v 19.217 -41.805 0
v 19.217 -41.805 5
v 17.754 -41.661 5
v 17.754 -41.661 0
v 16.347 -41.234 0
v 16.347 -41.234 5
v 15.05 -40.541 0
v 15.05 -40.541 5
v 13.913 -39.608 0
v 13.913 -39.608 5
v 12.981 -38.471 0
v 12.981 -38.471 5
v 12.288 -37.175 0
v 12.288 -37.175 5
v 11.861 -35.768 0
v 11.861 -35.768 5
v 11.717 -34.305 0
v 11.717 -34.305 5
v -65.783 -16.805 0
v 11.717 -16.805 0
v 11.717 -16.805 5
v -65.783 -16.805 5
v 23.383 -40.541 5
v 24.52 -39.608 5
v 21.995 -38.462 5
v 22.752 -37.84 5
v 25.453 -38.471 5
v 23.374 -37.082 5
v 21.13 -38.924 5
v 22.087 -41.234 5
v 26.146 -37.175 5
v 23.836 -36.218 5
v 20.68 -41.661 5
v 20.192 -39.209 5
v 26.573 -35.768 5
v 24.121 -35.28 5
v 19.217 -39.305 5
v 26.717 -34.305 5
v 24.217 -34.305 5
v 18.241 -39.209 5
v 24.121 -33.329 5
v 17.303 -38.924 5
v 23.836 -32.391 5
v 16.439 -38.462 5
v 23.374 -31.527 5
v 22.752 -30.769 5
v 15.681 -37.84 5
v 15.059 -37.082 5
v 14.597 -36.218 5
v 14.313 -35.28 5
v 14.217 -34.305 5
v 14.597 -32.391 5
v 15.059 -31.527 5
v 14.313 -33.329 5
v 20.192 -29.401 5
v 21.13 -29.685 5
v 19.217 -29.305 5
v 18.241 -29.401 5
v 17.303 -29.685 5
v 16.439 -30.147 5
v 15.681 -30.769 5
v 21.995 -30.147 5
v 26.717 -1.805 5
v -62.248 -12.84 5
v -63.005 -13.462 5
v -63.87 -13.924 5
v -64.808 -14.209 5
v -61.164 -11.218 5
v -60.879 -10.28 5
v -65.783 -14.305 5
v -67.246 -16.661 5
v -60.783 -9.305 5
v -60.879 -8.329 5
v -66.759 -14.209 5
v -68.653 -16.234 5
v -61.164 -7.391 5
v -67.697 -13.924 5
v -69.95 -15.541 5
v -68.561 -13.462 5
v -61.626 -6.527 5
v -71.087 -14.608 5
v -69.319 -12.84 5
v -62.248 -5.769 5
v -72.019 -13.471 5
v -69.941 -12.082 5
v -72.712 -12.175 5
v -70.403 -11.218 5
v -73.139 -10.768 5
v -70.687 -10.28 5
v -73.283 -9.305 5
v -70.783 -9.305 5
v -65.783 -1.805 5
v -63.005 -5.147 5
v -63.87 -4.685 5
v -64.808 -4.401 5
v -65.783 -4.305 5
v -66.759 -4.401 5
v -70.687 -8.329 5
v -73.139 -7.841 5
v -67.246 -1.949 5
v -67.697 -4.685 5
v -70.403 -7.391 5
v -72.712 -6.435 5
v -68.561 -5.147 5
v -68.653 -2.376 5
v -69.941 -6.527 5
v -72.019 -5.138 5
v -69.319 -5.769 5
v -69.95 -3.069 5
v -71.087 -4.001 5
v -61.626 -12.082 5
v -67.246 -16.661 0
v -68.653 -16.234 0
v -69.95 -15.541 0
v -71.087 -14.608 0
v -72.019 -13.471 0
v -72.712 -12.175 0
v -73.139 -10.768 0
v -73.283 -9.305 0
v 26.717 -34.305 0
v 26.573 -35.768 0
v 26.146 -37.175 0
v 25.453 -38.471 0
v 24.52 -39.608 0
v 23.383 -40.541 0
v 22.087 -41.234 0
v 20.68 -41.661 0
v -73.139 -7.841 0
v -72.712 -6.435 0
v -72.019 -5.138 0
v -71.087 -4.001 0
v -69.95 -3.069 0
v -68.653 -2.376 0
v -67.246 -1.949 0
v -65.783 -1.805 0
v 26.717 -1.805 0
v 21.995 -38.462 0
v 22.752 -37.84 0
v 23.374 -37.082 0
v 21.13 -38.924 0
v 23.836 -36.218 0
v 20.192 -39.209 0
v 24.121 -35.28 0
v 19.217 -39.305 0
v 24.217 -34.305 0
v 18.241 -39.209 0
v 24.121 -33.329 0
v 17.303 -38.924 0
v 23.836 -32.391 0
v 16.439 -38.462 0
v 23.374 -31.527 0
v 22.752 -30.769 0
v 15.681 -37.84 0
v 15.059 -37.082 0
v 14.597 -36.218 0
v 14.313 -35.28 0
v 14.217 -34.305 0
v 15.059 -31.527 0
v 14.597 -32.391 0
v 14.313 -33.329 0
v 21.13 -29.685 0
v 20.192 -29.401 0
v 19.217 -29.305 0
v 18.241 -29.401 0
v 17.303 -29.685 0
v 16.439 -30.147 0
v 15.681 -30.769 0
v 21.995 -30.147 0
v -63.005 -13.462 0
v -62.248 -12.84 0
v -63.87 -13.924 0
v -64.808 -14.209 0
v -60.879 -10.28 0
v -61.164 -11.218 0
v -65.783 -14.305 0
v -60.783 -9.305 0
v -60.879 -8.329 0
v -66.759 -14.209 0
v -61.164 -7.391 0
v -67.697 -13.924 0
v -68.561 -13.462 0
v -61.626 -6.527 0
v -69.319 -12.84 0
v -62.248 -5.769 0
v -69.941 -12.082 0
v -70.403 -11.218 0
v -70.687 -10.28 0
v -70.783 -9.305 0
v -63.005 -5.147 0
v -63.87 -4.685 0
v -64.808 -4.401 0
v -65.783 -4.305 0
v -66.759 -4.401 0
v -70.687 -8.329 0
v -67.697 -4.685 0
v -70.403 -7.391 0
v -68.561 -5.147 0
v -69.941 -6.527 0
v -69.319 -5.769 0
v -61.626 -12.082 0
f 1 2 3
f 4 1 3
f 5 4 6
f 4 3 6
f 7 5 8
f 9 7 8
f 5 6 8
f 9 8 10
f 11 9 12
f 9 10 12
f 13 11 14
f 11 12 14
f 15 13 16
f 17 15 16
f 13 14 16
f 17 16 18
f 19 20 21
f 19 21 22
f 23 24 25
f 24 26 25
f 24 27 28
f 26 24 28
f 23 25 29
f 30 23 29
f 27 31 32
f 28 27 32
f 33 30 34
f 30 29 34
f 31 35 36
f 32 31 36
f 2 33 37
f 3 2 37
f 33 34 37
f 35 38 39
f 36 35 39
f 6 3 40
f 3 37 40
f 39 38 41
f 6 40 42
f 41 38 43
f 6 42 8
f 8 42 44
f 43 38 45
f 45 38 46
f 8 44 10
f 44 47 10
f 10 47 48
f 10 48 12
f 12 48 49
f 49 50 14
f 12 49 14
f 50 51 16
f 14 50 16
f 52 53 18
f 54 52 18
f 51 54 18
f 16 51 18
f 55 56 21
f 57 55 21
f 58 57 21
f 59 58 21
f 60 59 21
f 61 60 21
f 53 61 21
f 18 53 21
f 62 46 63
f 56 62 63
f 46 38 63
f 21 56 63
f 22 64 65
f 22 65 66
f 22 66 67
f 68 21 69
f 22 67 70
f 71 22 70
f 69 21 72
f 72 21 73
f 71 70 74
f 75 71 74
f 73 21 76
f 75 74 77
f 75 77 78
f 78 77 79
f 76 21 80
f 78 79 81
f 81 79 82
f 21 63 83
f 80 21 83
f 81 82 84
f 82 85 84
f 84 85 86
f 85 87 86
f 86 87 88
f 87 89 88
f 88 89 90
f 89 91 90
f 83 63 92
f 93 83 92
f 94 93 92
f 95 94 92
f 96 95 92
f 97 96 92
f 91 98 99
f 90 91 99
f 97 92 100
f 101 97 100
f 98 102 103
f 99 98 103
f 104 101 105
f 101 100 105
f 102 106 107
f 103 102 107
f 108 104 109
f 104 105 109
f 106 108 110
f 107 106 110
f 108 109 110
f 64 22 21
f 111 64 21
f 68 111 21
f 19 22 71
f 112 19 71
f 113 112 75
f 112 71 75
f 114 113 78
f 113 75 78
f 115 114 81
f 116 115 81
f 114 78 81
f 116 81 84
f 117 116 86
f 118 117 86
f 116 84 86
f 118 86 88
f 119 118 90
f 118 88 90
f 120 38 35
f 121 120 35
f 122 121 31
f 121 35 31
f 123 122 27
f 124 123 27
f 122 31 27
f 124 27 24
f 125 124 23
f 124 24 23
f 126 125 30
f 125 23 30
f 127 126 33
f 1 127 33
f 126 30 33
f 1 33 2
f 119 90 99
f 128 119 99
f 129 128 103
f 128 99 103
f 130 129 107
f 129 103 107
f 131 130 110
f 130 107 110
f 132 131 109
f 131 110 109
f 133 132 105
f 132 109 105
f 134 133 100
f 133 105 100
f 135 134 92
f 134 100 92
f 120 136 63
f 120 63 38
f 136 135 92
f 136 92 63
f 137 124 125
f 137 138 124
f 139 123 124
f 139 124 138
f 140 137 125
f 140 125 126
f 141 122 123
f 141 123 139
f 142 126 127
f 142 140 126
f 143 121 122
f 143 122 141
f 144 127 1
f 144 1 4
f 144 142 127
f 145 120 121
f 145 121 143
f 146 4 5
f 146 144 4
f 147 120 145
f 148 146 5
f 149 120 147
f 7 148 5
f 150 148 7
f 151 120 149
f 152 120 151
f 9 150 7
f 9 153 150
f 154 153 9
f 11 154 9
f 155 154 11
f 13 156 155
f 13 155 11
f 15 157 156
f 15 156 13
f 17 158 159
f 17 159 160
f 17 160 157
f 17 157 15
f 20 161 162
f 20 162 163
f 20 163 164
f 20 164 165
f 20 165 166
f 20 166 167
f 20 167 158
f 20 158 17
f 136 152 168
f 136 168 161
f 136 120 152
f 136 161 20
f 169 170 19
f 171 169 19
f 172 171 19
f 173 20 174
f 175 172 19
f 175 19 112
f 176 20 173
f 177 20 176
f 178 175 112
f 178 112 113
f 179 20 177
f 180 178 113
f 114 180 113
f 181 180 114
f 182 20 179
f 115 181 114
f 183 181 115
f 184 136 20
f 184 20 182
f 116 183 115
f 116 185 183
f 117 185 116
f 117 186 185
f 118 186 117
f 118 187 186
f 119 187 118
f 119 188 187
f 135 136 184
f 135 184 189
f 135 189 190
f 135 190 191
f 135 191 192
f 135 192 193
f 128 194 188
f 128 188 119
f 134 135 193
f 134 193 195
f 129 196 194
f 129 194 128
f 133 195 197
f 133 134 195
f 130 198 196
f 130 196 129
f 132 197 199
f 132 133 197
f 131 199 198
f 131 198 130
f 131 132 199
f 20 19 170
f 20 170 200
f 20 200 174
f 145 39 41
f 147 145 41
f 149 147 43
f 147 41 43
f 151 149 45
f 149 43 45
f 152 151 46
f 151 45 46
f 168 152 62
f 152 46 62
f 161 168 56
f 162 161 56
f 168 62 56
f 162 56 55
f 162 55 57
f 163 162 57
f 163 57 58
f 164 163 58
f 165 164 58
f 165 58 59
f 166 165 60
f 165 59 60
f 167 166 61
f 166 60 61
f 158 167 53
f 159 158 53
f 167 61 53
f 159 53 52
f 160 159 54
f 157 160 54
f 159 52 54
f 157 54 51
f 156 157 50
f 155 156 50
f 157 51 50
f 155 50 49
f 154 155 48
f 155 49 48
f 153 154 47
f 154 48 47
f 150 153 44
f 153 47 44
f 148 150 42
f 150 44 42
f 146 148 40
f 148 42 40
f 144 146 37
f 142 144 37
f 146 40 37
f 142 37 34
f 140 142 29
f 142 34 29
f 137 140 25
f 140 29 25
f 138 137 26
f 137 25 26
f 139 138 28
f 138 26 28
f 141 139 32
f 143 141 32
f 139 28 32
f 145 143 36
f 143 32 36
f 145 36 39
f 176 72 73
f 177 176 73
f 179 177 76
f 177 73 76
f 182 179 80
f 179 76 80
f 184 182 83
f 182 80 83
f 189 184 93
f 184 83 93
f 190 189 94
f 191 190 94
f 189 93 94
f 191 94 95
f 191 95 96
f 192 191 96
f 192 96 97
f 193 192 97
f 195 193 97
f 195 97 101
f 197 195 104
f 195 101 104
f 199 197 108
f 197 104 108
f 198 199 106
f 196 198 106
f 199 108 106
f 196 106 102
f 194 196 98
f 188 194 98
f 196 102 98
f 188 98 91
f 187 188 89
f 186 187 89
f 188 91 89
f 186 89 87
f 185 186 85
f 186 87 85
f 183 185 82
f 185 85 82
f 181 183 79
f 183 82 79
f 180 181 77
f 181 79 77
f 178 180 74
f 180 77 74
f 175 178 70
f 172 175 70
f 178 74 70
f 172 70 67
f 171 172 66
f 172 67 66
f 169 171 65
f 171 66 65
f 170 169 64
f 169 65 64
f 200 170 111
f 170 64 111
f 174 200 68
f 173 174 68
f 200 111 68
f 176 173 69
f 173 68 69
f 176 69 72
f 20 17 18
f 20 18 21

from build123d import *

# Parameters (mm, degrees)
BOSS_EXTRUDE1_DEPTH = 5
SKETCH2_R           = 5
CUT_EXTRUDE1_DEPTH  = 5


with BuildPart() as part:
    # Sketch1 → Boss-Extrude1 (new body)
    with BuildSketch(Plane.XY):
        Polygon((-73.283312465, -1.804635762), (26.716687535, -1.804635762), (26.716687535, -41.804635762), (11.716687535, -41.804635762), (11.716687535, -16.804635762), (-73.283312465, -16.804635762), align=None)
    extrude(amount=BOSS_EXTRUDE1_DEPTH)

    # Sketch2 → Cut-Extrude1 (cut)
    with BuildSketch(Plane.XY.offset(5)):
        with Locations((19.216687535, -34.304635762)):
            Circle(SKETCH2_R)
        with BuildLine():
            ThreePointArc((19.216687535, -41.804635762), (13.913386676, -39.60793662), (11.716687535, -34.304635762))
            Line((11.716687535, -34.304635762), (11.716687535, -41.804635762))
            Line((11.716687535, -41.804635762), (19.216687535, -41.804635762))
        make_face()
        with BuildLine():
            Line((26.716687535, -41.804635762), (26.716687535, -34.304635762))
            ThreePointArc((26.716687535, -34.304635762), (24.519988394, -39.60793662), (19.216687535, -41.804635762))
            Line((19.216687535, -41.804635762), (26.716687535, -41.804635762))
        make_face()
        with Locations((-65.783312465, -9.304635762)):
            Circle(SKETCH2_R)
        with BuildLine():
            Line((-65.783312465, -1.804635762), (-73.283312465, -1.804635762))
            Line((-73.283312465, -1.804635762), (-73.283312465, -9.304635859))
            ThreePointArc((-73.283312465, -9.304635859), (-71.086613359, -4.001334937), (-65.783312465, -1.804635762))
        make_face()
        with BuildLine():
            ThreePointArc((-65.783312465, -16.804635762), (-71.086613289, -14.607936655), (-73.283312465, -9.304635859))
            Line((-73.283312465, -9.304635859), (-73.283312465, -16.804635762))
            Line((-73.283312465, -16.804635762), (-65.783312465, -16.804635762))
        make_face()
    extrude(amount=-CUT_EXTRUDE1_DEPTH, mode=Mode.SUBTRACT)


solid = part.part
